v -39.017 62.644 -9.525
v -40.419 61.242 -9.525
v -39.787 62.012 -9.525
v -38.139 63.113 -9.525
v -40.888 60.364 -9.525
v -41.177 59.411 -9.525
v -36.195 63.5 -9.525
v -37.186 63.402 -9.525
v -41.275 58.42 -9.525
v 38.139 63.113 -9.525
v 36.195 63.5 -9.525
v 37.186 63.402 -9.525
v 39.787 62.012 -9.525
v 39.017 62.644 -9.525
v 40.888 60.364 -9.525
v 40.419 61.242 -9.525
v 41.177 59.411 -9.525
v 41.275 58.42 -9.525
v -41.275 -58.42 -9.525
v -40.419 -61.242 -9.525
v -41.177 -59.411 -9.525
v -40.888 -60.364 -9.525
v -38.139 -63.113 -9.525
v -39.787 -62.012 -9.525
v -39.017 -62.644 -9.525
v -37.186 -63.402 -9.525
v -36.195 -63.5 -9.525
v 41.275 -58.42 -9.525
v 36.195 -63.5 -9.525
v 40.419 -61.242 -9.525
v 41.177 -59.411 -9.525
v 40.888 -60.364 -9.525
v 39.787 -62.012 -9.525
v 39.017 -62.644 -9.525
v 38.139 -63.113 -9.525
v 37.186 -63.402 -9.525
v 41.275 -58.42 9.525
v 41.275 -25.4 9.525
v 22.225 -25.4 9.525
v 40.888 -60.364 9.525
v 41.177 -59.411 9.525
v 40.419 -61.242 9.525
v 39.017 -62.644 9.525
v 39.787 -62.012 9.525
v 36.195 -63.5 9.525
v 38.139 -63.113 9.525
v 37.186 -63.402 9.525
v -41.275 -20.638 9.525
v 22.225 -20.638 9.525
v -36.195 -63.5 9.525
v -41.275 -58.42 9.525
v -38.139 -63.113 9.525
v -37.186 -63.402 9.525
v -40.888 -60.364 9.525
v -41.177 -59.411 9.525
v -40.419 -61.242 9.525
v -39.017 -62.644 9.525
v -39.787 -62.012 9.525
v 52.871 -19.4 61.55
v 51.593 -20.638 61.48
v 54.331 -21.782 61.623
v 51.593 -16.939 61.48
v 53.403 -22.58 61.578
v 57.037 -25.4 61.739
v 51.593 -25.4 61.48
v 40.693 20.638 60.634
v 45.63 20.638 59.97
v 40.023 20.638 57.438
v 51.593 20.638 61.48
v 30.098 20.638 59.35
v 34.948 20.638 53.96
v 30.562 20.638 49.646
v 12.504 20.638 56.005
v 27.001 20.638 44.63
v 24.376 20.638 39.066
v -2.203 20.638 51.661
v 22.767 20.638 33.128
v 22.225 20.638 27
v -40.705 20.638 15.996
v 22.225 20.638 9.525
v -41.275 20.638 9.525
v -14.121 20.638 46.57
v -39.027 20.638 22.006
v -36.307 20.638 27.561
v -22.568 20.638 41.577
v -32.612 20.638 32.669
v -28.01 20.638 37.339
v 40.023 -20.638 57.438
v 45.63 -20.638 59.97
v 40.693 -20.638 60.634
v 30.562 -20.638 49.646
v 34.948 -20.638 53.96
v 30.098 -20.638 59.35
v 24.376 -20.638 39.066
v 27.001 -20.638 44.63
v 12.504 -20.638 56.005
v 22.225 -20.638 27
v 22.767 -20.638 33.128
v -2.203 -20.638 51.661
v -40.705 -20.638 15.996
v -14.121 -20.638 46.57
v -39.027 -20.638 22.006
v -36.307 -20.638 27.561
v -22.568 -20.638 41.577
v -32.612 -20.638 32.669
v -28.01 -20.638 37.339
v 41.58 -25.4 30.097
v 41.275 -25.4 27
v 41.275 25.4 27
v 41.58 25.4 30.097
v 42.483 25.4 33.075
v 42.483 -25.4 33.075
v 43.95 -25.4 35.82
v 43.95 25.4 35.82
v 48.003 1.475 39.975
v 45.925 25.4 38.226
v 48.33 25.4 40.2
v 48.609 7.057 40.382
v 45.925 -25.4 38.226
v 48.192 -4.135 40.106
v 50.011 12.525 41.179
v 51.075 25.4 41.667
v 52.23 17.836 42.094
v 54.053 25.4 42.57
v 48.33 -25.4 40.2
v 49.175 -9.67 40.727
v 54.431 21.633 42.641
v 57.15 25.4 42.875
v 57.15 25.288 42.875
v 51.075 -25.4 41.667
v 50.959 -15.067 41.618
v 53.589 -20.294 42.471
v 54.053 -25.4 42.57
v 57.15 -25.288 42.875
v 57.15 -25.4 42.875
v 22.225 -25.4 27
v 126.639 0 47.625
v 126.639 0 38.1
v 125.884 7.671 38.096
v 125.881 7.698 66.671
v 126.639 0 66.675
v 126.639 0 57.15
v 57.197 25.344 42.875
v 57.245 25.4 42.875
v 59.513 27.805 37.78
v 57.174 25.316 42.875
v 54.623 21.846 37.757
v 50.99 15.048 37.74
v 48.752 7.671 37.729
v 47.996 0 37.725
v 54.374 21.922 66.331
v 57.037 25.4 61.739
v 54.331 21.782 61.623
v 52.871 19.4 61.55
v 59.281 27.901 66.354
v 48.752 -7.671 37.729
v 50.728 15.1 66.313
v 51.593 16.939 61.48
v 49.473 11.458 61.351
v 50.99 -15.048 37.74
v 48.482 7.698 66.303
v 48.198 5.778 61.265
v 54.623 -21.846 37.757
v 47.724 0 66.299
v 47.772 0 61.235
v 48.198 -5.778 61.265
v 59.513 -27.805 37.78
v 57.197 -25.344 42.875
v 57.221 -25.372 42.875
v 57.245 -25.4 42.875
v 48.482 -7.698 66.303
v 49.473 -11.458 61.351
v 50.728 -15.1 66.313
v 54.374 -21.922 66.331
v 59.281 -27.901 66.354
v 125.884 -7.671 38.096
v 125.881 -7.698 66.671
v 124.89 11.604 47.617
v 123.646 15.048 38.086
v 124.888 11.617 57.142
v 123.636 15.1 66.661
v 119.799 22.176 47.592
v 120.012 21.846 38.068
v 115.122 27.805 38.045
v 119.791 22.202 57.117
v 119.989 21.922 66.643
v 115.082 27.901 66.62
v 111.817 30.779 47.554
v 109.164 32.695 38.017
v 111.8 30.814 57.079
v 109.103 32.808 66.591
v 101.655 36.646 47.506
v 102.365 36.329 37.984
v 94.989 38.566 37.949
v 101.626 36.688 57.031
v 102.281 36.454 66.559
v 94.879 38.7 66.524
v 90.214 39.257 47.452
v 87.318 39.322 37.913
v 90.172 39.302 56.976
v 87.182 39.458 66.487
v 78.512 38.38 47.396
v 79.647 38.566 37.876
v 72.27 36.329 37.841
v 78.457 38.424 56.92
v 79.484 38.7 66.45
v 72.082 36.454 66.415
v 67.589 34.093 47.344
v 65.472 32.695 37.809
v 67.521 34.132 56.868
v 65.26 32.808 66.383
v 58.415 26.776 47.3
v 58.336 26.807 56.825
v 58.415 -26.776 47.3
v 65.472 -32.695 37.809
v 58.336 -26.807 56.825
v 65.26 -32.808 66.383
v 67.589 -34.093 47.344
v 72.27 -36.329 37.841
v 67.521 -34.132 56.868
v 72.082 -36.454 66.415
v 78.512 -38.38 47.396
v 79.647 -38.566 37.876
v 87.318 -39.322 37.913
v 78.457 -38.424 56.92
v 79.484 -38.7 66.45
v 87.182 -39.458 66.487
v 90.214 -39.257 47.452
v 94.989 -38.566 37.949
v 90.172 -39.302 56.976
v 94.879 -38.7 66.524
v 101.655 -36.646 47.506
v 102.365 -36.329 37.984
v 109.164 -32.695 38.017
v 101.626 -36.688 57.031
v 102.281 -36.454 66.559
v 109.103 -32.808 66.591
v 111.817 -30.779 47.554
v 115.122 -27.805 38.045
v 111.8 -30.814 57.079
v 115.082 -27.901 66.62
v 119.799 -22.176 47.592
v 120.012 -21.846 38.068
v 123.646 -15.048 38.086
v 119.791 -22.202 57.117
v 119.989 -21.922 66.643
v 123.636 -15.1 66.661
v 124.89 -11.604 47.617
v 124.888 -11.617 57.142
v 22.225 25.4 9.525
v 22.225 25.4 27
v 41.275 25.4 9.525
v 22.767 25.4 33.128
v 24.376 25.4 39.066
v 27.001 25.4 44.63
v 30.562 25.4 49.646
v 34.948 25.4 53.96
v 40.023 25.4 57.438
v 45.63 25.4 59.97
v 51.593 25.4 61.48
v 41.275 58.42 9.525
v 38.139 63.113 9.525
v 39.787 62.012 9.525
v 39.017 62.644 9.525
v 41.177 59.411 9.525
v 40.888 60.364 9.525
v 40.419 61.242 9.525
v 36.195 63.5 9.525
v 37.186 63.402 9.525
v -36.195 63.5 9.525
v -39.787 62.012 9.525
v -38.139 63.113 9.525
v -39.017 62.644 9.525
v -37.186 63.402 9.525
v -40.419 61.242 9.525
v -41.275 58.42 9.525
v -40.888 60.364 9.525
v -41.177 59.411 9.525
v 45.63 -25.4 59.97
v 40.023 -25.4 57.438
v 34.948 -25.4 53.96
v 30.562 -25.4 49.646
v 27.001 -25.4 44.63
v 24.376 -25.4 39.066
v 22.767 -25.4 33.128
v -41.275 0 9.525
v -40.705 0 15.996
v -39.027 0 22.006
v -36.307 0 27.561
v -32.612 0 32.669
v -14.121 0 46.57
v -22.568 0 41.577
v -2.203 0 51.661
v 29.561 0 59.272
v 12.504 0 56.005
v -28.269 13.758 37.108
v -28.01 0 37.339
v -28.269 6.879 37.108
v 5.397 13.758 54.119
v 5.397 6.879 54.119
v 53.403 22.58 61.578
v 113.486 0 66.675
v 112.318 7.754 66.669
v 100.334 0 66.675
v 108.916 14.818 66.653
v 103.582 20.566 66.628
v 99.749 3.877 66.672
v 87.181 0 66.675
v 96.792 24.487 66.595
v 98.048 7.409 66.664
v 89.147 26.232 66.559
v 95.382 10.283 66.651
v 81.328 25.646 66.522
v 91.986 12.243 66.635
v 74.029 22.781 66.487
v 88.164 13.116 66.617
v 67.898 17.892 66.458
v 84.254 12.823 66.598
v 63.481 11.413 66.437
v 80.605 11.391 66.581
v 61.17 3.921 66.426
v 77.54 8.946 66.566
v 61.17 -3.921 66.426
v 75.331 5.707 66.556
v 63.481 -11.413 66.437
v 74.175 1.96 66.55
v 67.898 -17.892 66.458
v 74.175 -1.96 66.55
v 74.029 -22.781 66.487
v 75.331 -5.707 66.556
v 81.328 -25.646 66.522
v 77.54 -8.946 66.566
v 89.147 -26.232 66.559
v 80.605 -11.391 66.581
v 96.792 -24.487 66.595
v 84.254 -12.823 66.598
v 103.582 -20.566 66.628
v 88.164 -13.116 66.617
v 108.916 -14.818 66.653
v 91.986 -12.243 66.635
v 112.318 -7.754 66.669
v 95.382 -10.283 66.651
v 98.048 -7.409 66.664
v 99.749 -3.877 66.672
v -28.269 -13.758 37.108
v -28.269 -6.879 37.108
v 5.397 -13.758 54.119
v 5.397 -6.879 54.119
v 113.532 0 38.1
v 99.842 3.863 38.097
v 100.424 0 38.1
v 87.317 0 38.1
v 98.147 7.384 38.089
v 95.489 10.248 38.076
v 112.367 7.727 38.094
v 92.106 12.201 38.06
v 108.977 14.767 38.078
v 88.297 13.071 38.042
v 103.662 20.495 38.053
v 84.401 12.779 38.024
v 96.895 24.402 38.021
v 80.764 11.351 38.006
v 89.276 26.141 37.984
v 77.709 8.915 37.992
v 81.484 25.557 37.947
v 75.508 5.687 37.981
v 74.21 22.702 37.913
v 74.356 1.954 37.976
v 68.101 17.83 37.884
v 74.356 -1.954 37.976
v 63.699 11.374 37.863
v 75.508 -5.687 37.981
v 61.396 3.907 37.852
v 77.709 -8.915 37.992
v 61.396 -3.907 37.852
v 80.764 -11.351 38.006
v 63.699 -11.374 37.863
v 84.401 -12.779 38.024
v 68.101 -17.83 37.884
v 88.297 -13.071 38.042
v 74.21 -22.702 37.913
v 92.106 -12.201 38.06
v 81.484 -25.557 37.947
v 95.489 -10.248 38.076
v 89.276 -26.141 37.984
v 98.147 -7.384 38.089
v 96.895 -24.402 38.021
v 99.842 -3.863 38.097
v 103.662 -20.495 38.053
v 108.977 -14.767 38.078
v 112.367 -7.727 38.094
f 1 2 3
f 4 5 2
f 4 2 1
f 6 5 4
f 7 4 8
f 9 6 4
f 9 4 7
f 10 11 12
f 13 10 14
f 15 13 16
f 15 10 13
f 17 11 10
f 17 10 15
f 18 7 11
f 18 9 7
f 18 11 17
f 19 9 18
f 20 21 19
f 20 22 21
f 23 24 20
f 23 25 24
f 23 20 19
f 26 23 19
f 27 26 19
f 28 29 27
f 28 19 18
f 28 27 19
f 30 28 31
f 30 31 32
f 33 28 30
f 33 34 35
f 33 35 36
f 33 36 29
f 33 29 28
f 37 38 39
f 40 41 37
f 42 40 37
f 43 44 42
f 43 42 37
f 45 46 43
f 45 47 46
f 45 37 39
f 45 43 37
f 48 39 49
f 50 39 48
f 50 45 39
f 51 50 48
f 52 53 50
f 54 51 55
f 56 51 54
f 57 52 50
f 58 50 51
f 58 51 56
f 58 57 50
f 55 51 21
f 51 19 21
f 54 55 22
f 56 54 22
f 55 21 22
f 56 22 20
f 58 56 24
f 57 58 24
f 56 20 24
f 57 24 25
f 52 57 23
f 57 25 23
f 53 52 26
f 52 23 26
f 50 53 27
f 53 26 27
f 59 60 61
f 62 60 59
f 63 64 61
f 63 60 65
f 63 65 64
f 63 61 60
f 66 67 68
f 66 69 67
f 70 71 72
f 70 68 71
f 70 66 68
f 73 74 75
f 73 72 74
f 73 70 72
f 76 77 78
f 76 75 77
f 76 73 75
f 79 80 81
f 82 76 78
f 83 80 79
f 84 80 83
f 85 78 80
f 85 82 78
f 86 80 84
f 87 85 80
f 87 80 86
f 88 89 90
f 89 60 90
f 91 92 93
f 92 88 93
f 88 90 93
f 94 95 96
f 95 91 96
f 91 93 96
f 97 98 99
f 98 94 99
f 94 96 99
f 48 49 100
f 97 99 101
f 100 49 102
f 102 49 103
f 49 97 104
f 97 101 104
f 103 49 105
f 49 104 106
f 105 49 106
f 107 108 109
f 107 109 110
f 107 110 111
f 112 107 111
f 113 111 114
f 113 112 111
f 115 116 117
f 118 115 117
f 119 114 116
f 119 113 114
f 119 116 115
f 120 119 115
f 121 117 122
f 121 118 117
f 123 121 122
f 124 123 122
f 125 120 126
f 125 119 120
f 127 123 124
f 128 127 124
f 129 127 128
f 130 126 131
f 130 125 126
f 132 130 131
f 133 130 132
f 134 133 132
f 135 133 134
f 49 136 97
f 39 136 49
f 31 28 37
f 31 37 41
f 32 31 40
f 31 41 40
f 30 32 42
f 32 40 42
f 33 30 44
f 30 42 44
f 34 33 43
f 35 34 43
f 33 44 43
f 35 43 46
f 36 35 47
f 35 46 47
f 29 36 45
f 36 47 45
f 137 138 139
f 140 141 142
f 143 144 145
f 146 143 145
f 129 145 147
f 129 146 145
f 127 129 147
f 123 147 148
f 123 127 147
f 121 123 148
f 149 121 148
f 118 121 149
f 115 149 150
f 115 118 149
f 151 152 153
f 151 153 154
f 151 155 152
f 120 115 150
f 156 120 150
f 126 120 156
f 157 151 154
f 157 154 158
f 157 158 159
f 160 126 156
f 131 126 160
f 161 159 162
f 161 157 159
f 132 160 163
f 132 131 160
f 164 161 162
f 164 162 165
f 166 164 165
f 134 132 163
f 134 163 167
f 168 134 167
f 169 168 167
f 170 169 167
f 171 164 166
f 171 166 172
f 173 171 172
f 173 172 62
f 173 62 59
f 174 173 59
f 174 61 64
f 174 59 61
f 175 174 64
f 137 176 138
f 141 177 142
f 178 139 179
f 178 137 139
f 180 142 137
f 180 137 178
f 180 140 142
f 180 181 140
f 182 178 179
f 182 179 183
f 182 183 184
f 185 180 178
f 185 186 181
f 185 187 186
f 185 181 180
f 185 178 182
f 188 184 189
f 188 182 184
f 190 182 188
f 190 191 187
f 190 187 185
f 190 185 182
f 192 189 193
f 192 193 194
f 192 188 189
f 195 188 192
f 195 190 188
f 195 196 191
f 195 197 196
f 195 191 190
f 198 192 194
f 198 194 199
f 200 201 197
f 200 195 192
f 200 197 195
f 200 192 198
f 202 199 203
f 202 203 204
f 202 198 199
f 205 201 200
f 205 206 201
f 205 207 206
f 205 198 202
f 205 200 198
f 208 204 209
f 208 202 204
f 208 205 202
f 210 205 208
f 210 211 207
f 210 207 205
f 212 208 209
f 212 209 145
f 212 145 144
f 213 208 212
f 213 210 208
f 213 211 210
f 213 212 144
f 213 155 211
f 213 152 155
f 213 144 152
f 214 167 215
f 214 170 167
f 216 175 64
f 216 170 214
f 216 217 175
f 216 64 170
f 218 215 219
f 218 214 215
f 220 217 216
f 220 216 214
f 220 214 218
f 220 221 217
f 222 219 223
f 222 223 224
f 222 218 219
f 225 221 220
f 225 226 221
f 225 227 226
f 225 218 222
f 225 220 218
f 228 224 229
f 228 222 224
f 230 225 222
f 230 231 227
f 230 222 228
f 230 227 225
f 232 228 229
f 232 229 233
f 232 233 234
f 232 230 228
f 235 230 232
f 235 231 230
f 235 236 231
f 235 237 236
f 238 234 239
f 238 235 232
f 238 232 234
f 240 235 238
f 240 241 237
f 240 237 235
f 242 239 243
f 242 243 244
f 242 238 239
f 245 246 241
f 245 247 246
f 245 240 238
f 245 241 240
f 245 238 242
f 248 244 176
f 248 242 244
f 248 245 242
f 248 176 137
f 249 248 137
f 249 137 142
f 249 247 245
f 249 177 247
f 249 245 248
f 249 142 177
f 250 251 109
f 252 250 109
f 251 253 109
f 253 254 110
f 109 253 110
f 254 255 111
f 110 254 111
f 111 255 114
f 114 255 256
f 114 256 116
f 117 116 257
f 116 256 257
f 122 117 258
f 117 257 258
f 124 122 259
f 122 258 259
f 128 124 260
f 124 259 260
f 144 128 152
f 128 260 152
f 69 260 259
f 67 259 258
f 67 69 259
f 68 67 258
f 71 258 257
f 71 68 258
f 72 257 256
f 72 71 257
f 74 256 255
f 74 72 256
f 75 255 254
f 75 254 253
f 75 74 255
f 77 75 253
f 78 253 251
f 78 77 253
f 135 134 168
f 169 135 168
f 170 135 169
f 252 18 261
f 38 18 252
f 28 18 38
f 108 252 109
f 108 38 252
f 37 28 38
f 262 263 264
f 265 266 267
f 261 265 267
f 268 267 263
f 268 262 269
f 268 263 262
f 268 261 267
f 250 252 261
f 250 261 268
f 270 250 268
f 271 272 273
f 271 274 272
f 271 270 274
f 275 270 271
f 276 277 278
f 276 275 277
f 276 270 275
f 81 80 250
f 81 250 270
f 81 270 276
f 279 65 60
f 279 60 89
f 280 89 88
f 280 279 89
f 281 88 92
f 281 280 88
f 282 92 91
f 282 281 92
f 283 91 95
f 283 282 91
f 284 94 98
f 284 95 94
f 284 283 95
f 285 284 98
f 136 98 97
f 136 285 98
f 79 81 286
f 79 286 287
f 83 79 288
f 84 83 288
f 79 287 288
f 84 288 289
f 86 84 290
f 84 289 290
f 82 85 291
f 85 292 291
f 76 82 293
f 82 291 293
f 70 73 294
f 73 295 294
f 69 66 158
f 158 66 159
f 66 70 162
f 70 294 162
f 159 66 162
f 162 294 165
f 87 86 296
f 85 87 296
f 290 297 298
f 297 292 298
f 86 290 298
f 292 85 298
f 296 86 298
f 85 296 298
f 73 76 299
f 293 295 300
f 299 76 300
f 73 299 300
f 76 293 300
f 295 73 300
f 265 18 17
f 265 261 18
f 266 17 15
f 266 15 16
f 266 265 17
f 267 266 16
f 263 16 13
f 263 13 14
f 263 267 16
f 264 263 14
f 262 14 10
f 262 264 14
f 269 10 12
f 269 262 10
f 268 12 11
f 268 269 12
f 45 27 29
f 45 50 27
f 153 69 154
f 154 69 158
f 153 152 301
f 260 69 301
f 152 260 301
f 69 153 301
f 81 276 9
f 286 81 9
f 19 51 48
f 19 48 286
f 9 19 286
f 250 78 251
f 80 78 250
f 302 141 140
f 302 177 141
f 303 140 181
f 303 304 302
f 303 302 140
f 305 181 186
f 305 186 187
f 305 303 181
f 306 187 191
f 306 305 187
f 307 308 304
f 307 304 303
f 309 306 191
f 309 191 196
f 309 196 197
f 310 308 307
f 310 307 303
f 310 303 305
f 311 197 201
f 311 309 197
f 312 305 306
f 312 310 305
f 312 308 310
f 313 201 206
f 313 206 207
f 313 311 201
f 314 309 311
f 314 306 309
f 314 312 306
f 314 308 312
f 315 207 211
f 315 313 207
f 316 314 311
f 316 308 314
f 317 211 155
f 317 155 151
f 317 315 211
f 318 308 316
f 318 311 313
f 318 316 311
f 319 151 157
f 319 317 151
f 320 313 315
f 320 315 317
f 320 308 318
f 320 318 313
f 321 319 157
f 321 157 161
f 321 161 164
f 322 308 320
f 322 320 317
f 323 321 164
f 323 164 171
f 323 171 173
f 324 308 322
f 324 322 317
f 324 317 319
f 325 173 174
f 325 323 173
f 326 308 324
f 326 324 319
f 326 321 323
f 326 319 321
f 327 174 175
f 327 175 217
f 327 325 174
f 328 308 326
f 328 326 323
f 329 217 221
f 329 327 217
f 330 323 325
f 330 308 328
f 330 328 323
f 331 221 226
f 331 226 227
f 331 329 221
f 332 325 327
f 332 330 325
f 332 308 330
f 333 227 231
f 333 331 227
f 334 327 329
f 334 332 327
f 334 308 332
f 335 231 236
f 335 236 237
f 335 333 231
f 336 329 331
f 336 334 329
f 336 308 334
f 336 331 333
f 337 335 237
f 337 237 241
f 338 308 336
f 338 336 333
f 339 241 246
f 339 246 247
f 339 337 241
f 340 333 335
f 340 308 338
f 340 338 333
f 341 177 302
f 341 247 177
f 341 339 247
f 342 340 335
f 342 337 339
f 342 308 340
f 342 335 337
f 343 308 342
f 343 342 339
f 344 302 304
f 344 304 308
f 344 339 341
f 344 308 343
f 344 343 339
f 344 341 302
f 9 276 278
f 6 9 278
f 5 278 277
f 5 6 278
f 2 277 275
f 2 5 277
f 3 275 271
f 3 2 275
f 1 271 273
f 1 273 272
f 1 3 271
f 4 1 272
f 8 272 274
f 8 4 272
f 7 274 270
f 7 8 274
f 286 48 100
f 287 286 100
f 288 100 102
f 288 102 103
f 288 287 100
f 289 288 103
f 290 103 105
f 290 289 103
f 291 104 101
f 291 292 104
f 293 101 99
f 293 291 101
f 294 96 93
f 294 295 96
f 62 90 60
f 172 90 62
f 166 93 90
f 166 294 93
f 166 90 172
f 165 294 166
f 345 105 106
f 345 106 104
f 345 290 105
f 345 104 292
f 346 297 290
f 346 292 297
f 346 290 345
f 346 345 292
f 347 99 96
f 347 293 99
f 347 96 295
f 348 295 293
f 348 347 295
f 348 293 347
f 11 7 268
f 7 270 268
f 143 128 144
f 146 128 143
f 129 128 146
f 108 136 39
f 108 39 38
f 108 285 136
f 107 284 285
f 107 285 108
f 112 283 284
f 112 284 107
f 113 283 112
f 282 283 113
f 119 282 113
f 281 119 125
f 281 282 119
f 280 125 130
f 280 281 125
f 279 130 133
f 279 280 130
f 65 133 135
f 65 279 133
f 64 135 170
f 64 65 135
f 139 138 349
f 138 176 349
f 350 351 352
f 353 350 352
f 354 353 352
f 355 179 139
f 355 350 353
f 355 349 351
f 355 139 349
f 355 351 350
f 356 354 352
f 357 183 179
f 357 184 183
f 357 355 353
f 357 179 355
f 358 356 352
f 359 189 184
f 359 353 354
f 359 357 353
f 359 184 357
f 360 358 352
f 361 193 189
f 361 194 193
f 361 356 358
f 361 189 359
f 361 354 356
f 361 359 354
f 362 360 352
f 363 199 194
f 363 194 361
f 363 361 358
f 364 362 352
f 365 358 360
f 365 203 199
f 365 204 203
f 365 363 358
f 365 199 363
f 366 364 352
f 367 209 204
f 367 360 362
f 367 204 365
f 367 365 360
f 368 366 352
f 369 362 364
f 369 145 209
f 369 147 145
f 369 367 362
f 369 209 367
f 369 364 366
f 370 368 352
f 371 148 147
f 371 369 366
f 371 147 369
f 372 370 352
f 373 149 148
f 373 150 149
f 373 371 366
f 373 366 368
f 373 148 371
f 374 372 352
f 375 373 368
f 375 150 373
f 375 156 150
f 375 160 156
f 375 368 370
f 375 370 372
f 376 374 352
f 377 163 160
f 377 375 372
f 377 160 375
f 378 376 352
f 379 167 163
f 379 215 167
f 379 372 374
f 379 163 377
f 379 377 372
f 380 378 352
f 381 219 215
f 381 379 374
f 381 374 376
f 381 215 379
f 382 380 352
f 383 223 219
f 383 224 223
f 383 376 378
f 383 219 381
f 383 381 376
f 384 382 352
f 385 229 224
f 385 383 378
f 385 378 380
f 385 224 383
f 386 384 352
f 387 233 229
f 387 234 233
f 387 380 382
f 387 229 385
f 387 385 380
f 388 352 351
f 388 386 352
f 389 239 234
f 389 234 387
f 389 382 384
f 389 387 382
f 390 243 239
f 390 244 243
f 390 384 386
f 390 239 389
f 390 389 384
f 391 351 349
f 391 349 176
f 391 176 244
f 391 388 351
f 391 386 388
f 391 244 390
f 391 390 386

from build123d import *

# Parameters (mm, degrees)
F1_DEPTH = 63.5
F2_DEPTH = 25.4
F3_DEPTH = 20.6375
F5_R     = 5.08


with BuildPart() as f1:
    # F0 (on Front) → F1 (new body, symmetric)
    with BuildSketch(Plane.XZ):
        Polygon((-41.275, -9.525), (41.275, -9.525), (41.275, 9.525), (22.225, 9.525), (-41.275, 9.525), align=None)
    extrude(amount=F1_DEPTH, both=True)

    # F0 (on Front) → F2 (join, symmetric)
    with BuildSketch(Plane.XZ):
        with BuildLine():
            Line((22.225, 9.525), (41.275, 9.525))
            Line((41.275, 9.525), (41.275, 27.0002))
            ThreePointArc((41.275, 27.0002), (45.9246798487, 38.2255201513), (57.15, 42.8752))
            Line((57.15, 42.8752), (75.8391746044, 42.8752))
            Line((75.8391746044, 42.8752), (75.8391746044, 61.9252))
            Line((75.8391746044, 61.9252), (72.1653963261, 61.9252))
            Line((72.1653963261, 61.9252), (64.4478433083, 61.9252))
            add(Edge.make_bspline(
                [(51.5934381261, 61.4803427657), (55.8377621911, 61.7230212557), (60.1301345398, 61.8704467699), (64.4478433083, 61.9252)],
                knots=[109.9989727247, 109.9989727247, 109.9989727247, 109.9989727247, 119.3829591055, 119.3829591055, 119.3829591055, 119.3829591055], degree=3))
            ThreePointArc((51.5934381261, 61.4803427657), (30.5622345011, 49.6463111623), (22.225, 27.0002))
            Line((22.225, 27.0002), (22.225, 9.525))
        make_face()
    extrude(amount=F2_DEPTH, both=True)

    # F0 (on Front) → F3 (join, symmetric)
    with BuildSketch(Plane.XZ):
        with BuildLine():
            add(Edge.make_bspline(
                [(-41.275, 9.525), (-41.3083164925, 42.7027595487), (1.841523734, 58.6356684957), (51.5934381261, 61.4803427657)],
                knots=[0, 0, 0, 0, 109.9989727247, 109.9989727247, 109.9989727247, 109.9989727247], degree=3))
            Line((-41.275, 9.525), (22.225, 9.525))
            Line((22.225, 9.525), (22.225, 27.0002))
            ThreePointArc((22.225, 27.0002), (30.5622345011, 49.6463111623), (51.5934381261, 61.4803427657))
        make_face()
    extrude(amount=F3_DEPTH, both=True)

    # F0 (on Front) → F4 (revolve)
    with BuildSketch(Plane.XZ):
        Polygon((87.1807926523, 66.675), (87.3169004917, 38.1), (126.6391746044, 38.1), (126.6391746044, 66.675), align=None)
    revolve(axis=Axis((87.248846572, 0, 52.3875), (-0.004763125, 0, 0.9999886563)))

    # F5
    f5_edges = [f1.edges().sort_by_distance(p)[0] for p in [
        (41.275, -63.5, 0),
        (-41.275, -63.5, 0),
        (41.275, 63.5, 0),
        (-41.275, 63.5, 0),
    ]]
    fillet(f5_edges, radius=F5_R)


solid = f1.part
